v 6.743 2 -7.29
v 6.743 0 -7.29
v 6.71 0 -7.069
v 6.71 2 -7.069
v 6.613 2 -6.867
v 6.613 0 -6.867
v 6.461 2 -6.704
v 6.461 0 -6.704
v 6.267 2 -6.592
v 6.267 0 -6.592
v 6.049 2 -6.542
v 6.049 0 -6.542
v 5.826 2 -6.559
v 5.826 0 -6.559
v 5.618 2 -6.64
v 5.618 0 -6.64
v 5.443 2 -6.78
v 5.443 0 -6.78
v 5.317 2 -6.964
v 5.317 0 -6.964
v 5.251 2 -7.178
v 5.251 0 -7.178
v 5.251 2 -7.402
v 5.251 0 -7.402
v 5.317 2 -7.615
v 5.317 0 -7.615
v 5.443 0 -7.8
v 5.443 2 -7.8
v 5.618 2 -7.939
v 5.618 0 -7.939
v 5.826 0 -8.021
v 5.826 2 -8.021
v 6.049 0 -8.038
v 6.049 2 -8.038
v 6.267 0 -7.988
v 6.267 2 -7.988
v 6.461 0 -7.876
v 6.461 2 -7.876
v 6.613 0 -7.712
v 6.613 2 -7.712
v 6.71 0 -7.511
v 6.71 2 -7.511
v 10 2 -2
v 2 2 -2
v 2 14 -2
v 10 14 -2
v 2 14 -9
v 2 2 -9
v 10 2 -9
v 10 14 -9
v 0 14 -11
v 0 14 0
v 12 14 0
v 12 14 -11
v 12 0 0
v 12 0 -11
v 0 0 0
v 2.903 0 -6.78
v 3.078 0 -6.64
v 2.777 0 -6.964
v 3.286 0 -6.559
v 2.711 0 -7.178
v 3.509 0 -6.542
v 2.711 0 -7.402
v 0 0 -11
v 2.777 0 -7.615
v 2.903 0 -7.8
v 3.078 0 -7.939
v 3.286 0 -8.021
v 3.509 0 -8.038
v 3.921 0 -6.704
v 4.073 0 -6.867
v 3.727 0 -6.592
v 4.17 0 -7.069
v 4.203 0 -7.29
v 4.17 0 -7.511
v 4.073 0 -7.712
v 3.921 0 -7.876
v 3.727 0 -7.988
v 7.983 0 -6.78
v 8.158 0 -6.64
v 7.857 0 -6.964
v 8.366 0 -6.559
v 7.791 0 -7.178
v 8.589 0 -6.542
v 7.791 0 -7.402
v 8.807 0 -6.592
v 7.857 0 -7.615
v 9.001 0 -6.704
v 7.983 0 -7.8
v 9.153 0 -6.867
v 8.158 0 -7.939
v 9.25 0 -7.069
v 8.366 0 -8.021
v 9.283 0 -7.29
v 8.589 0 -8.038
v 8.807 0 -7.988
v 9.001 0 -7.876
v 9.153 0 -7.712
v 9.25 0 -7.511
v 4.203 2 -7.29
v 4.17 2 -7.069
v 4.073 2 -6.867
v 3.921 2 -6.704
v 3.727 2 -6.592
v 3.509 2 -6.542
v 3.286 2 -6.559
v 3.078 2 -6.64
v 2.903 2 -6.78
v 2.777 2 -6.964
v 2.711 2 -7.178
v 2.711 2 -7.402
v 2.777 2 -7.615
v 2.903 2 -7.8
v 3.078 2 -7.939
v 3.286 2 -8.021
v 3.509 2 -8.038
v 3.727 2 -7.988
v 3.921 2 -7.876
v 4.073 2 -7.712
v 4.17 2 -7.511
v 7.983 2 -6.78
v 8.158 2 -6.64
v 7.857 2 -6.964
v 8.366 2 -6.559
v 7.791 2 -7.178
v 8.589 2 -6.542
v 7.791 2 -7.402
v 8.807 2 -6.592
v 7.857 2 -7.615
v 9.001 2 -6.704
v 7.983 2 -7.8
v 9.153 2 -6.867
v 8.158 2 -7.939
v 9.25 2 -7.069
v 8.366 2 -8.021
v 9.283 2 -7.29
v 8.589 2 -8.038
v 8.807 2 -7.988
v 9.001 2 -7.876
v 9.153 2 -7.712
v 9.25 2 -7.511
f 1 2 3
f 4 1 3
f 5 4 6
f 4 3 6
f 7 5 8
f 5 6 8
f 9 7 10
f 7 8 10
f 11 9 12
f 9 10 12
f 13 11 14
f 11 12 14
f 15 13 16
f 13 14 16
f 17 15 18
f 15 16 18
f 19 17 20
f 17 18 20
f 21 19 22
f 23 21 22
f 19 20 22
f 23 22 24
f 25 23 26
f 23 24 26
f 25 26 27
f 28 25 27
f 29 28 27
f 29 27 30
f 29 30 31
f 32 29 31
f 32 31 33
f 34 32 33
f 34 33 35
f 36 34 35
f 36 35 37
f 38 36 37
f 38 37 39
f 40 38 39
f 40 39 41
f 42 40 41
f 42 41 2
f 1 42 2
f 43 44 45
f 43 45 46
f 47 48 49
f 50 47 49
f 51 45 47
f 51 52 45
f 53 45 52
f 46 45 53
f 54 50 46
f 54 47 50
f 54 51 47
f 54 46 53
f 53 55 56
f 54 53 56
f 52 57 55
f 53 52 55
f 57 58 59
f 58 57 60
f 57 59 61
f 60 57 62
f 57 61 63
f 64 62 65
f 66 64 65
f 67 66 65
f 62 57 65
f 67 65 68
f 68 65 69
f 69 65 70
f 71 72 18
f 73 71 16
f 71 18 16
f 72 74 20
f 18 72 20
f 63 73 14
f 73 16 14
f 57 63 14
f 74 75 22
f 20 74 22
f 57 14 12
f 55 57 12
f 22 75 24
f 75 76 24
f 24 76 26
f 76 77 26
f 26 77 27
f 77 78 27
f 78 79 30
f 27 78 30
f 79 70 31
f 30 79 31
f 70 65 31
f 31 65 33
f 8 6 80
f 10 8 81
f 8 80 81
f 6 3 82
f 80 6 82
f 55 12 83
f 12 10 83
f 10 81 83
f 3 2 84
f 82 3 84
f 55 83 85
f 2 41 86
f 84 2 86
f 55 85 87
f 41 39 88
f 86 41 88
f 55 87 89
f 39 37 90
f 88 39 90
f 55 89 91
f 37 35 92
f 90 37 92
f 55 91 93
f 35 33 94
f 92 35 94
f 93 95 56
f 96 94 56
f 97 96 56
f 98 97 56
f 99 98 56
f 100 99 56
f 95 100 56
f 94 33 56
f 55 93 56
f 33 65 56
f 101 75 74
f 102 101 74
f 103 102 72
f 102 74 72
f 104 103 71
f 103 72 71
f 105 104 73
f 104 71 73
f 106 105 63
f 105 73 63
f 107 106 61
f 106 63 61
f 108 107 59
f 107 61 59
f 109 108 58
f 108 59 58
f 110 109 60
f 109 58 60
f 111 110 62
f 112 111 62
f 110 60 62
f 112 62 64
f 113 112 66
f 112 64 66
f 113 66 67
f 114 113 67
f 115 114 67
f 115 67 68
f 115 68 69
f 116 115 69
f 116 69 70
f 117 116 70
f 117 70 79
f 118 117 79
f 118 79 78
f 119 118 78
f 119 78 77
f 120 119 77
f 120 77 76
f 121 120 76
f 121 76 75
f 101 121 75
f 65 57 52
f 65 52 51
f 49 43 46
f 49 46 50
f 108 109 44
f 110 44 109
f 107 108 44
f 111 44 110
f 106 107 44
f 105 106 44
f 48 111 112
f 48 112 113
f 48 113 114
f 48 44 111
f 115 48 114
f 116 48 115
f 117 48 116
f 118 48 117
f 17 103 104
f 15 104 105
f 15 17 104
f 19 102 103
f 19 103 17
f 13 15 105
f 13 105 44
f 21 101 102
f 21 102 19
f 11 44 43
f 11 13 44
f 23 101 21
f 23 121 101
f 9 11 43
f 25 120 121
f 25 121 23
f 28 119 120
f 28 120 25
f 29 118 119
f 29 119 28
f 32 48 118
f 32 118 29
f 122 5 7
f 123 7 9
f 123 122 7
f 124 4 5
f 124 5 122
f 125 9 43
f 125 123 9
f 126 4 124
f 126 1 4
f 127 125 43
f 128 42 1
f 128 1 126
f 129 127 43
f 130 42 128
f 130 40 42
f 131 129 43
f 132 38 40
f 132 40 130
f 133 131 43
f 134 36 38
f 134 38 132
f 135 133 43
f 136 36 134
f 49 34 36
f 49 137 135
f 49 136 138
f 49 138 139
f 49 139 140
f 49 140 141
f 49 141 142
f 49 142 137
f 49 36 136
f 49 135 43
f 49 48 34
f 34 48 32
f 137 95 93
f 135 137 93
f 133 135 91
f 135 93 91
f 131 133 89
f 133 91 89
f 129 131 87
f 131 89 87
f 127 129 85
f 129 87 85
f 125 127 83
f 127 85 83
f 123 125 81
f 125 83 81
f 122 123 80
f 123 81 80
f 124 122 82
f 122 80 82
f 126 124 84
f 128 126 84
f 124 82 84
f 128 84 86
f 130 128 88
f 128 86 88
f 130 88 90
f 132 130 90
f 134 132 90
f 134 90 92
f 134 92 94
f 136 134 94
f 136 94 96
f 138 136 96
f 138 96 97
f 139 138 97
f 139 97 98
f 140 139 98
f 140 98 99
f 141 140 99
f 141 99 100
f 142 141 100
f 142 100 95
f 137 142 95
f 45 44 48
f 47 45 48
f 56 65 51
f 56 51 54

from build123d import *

# Parameters (mm, degrees)
SKETCH1_W           = 12
SKETCH1_H           = 11
BOSS_EXTRUDE1_DEPTH = 14
SHELL1_T            = -2
SKETCH2_R           = 0.75
CUT_EXTRUDE1_DEPTH  = 10


with BuildPart() as part:
    # Sketch1 → Boss-Extrude1 (new body)
    with BuildSketch(Plane(origin=(0, 0, 0), x_dir=(1, 0, 0), z_dir=(0, 1, 0))):
        with Locations((6, 5.5)):
            Rectangle(SKETCH1_W, SKETCH1_H)
    extrude(amount=BOSS_EXTRUDE1_DEPTH)

    # Shell1
    shell1_openings = [part.faces().sort_by_distance(p)[0] for p in [
        (6, 14, -5.5),
    ]]
    offset(amount=SHELL1_T, openings=shell1_openings, kind=Kind.INTERSECTION)

    # Sketch2 → Cut-Extrude1 (cut)
    with BuildSketch(Plane.XZ):
        with Locations((3.452899673, -7.28987771)):
            Circle(SKETCH2_R)
        with Locations((5.992899673, -7.28987771)):
            Circle(SKETCH2_R)
        with Locations((8.532899673, -7.28987771)):
            Circle(SKETCH2_R)
    extrude(amount=-CUT_EXTRUDE1_DEPTH, mode=Mode.SUBTRACT)


solid = part.part
